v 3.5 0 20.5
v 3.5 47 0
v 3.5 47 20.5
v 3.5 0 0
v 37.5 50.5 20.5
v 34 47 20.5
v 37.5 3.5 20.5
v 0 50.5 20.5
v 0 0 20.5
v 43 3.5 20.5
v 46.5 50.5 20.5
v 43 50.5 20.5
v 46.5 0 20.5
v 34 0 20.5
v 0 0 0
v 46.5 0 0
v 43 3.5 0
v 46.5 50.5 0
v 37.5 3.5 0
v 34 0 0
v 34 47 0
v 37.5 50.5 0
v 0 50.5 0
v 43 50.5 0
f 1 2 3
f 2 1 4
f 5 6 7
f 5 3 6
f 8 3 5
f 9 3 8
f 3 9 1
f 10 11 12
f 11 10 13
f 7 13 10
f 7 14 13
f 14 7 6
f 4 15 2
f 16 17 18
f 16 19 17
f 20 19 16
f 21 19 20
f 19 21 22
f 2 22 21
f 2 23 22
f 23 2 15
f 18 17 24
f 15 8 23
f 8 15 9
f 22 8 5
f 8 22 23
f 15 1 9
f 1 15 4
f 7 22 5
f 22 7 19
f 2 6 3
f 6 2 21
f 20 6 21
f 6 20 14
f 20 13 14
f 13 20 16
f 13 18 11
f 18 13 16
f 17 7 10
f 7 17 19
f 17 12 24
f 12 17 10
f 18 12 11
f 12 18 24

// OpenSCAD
//CUSTOMIZER VARIABLES
//	Width of the clip
width = 20.5;

//	Height of the clip
height = 50.5;

//	Thickness of the clip
thickness = 3.5; // [spinbox:1.0:0.1:10]

//	Width of the first gap on the clip
gap1 = 30.5; // [spinbox:0.1:0.1:30]

//	Width of the second gap on the clip
gap2 = 5.5; // [spinbox:0.1:0.1:30]
//CUSTOMIZER VARIABLES END

//Z-CLIP
module zclip(w,h,t,d1,d2) {
	cube([t,h,w]);
	translate([t,h-t,0]) cube([d1+t,t,w]);
	translate([d1+t,0,0]) cube([t,h-t,w]);
	translate([d1+t+t,0,0]) cube([d2+t,t,w]);
	translate([d1+t+t+d2,t,0]) cube([t,h-t,w]);
}
zclip(width,height,thickness,gap1,gap2);
//Z-CLIP END
